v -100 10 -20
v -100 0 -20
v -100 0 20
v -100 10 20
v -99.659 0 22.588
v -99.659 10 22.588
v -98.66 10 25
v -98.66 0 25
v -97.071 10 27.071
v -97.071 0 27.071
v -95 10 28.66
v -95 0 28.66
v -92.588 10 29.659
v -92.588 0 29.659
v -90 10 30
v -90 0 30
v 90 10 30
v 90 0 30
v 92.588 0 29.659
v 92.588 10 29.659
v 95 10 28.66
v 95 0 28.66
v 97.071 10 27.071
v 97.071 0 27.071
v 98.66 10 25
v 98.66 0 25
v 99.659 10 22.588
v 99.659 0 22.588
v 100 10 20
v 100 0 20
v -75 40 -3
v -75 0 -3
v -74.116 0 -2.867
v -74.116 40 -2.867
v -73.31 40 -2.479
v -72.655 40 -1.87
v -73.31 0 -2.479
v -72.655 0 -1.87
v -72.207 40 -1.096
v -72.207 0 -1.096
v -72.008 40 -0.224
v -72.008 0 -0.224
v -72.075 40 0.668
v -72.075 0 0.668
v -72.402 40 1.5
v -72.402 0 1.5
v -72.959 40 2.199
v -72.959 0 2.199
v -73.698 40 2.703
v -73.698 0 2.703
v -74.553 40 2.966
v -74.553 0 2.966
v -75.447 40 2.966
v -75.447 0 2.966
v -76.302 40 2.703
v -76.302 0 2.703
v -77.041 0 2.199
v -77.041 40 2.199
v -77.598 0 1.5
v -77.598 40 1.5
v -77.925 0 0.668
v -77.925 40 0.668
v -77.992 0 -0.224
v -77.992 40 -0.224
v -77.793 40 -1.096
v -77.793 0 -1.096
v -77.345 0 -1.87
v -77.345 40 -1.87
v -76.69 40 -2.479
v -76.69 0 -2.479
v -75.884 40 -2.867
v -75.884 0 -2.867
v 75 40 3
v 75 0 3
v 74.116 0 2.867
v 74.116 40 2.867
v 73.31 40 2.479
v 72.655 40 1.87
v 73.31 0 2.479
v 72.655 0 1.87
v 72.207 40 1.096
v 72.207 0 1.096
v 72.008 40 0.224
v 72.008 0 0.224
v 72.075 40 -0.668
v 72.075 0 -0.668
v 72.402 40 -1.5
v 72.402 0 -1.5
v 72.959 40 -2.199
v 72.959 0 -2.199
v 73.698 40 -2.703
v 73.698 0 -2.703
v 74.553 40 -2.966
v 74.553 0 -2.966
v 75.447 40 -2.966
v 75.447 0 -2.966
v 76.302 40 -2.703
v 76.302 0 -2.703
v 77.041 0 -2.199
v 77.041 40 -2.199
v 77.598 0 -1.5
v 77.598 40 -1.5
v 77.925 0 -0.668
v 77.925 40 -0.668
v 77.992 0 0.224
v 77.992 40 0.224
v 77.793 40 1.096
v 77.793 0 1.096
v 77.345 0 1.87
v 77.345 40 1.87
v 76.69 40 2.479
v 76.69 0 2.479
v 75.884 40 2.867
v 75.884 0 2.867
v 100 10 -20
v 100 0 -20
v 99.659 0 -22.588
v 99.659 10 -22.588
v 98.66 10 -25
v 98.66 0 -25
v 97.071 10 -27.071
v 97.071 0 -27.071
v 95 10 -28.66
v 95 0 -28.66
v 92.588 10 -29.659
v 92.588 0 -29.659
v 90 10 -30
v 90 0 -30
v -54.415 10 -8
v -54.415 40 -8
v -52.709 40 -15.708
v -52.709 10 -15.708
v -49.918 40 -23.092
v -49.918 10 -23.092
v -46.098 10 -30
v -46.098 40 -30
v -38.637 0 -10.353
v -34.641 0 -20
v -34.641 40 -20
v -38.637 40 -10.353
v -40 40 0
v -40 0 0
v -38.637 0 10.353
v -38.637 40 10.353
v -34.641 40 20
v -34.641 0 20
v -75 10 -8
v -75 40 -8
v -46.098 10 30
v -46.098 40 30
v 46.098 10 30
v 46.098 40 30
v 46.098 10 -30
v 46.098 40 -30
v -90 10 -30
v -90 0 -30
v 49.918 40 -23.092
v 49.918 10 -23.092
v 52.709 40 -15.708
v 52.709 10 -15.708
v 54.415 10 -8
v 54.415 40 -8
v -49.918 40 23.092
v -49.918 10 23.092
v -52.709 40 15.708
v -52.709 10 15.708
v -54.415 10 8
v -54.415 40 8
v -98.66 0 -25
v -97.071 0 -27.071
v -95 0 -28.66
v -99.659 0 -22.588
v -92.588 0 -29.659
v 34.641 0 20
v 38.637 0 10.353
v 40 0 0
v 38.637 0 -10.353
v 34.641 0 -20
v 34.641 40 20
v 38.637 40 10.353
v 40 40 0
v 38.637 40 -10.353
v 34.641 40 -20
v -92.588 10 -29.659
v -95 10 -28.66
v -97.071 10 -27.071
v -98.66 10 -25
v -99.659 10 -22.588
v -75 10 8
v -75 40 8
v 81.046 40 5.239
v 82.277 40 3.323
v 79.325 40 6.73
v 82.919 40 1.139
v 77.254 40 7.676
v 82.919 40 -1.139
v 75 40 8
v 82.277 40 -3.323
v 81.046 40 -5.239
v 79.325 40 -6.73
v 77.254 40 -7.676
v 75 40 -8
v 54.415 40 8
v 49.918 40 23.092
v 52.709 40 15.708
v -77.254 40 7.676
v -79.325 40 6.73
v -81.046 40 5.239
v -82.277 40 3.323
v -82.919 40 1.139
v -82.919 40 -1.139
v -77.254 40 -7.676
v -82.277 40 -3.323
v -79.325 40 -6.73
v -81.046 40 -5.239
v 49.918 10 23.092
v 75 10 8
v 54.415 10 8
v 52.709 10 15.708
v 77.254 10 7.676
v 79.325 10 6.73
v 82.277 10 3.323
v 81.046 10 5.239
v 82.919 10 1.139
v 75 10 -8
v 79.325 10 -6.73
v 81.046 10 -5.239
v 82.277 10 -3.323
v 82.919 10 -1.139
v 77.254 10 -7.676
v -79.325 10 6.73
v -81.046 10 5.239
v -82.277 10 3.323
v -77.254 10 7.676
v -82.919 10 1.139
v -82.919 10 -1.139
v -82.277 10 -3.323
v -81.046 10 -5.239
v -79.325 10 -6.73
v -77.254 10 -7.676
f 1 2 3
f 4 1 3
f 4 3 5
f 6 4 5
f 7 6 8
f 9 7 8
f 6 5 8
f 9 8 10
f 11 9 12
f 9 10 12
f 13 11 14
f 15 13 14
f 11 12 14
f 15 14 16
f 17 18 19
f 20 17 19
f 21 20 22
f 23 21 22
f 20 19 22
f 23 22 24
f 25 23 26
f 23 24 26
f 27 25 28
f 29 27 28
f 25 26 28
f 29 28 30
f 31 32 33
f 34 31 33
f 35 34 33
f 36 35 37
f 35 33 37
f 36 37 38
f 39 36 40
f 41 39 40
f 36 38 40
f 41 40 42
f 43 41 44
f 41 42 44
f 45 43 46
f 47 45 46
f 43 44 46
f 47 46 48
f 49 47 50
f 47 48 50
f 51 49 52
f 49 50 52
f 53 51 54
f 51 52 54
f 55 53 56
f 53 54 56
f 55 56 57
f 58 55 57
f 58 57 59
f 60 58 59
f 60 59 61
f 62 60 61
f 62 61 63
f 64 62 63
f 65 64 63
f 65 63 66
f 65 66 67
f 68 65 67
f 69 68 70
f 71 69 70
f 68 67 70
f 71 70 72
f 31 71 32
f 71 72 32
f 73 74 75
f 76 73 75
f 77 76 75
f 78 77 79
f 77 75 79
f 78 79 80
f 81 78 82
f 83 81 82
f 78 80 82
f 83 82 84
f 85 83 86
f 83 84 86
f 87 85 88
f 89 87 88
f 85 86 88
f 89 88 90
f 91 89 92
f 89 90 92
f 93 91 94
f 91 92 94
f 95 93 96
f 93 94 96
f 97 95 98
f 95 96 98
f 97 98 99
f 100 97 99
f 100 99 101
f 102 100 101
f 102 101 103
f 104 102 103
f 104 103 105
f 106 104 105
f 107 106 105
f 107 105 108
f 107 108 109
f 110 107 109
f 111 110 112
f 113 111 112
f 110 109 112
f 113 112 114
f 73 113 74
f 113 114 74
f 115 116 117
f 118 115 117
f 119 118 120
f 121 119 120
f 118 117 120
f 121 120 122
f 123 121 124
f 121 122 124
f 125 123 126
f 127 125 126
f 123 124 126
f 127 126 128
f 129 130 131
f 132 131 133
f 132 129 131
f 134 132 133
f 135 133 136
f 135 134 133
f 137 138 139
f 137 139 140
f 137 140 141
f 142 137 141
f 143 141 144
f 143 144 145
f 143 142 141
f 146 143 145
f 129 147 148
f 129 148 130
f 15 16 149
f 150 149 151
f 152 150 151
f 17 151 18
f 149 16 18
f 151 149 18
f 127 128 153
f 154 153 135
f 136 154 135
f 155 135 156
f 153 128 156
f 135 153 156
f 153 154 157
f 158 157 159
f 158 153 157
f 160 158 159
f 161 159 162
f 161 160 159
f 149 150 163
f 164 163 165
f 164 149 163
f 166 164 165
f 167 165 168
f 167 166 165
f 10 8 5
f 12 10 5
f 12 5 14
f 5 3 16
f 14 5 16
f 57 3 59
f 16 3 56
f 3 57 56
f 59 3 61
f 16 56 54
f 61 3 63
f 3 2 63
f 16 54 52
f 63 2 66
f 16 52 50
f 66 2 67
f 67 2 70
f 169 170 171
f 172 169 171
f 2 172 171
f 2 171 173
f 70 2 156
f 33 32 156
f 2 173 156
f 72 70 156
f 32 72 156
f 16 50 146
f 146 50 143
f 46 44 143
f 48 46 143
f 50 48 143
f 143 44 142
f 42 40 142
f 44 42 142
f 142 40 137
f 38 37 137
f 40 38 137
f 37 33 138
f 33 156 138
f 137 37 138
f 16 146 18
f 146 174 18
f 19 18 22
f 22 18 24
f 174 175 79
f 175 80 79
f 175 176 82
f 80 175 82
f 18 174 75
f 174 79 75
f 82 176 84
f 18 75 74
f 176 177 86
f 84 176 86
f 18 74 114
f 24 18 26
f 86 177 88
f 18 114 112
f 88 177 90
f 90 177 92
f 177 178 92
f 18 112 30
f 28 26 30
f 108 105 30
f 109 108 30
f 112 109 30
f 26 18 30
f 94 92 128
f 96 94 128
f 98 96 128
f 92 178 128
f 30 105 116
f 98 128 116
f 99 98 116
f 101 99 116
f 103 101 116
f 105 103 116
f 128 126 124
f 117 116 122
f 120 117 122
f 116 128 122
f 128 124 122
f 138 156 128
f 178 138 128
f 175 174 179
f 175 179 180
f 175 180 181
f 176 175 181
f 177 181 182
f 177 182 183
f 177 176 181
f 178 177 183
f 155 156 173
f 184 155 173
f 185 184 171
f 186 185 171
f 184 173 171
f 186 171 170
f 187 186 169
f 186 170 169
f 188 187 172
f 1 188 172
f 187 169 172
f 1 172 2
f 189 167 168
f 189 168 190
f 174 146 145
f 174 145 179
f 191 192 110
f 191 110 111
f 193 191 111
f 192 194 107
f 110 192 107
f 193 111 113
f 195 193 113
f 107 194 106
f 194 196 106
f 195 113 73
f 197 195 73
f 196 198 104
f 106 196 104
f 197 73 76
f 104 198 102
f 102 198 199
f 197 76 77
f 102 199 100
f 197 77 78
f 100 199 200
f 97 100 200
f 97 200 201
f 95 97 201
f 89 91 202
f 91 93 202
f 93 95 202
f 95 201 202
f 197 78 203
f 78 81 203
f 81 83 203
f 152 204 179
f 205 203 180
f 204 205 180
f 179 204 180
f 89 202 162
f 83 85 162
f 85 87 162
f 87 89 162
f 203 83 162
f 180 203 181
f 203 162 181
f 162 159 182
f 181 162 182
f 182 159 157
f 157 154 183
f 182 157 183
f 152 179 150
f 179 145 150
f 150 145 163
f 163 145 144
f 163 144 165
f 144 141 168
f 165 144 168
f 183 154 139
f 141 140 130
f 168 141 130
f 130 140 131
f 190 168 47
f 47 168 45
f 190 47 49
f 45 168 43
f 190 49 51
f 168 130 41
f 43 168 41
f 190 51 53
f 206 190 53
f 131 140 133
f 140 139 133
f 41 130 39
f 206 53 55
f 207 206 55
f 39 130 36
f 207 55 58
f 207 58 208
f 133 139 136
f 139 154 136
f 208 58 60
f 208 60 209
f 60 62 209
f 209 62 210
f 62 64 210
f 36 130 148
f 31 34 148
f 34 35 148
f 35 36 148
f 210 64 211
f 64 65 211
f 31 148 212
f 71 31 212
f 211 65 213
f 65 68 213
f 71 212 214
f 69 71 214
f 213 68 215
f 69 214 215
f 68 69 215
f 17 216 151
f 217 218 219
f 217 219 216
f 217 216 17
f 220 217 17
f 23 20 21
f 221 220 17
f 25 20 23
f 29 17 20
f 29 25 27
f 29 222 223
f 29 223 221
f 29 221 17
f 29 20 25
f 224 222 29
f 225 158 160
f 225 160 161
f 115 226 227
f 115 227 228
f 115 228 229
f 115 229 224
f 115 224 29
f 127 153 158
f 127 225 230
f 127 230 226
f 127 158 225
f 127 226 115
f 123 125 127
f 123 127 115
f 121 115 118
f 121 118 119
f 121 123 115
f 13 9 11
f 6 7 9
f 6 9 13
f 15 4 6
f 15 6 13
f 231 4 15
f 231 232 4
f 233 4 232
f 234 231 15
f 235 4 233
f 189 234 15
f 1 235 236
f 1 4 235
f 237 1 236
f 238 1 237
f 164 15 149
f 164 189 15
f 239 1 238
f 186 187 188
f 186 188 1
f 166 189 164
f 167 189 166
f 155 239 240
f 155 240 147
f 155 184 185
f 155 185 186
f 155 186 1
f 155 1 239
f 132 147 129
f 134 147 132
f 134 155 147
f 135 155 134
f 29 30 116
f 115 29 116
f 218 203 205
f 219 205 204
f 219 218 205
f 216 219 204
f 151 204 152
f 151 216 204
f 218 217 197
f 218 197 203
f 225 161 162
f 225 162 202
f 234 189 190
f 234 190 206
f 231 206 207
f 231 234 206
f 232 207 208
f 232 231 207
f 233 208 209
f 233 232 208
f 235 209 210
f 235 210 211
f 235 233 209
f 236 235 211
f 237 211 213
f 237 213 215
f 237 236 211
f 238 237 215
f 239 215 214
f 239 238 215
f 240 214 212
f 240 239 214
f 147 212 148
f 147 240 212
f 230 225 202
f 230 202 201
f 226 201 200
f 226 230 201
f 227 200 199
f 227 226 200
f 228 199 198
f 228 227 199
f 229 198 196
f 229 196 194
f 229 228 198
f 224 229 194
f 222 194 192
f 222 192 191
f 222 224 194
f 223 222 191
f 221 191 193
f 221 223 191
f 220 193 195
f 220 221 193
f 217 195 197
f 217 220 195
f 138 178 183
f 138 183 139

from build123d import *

# Parameters (mm, degrees)
EXTRUDE_2_DEPTH     = 10
EXTRUDE_3_DEPTH     = 30
SKETCH_7_R          = 3
CUT_EXTRUDE_3_DEPTH = 40


with BuildPart() as part:
    # 草图1 → 凸台-拉伸2 (new body)
    with BuildSketch(Plane(origin=(0, 0, 0), x_dir=(1, 0, 0), z_dir=(0, 1, 0))):
        with BuildLine():
            Line((100, -20), (100, 20))
            ThreePointArc((100, 20), (97.071067812, 27.071067812), (90, 30))
            Line((90, 30), (-90, 30))
            ThreePointArc((-90, 30), (-97.071067812, 27.071067812), (-100, 20))
            Line((-100, 20), (-100, -20))
            ThreePointArc((-100, -20), (-97.071067812, -27.071067812), (-90, -30))
            Line((-90, -30), (90, -30))
            ThreePointArc((90, -30), (97.071067812, -27.071067812), (100, -20))
        make_face()
    extrude(amount=EXTRUDE_2_DEPTH)

    # 草图5 → 凸台-拉伸3 (add)
    with BuildSketch(Plane(origin=(0, 10, 0), x_dir=(1, 0, 0), z_dir=(0, 1, 0))):
        with BuildLine():
            Line((-46.097722286, 30), (46.097722286, 30))
            ThreePointArc((46.097722286, 30), (51.446141019, 19.449796252), (54.415071442, 8))
            Line((54.415071442, 8), (75, 8))
            ThreePointArc((75, 8), (83, 0), (75, -8))
            Line((75, -8), (54.415071442, -8))
            ThreePointArc((54.415071442, -8), (51.446141019, -19.449796252), (46.097722286, -30))
            Line((46.097722286, -30), (-46.097722286, -30))
            ThreePointArc((-46.097722286, -30), (-51.446141019, -19.449796252), (-54.415071442, -8))
            Line((-54.415071442, -8), (-75, -8))
            ThreePointArc((-75, -8), (-83, 0), (-75, 8))
            Line((-75, 8), (-54.415071442, 8))
            ThreePointArc((-54.415071442, 8), (-51.446141019, 19.449796252), (-46.097722286, 30))
        make_face()
    extrude(amount=EXTRUDE_3_DEPTH)

    # 草图7 → 切除-拉伸3 (cut)
    with BuildSketch(Plane.XZ):
        with Locations(Location((-75, 0, 0), (0, 0, 270))):
            Circle(SKETCH_7_R)
        with Locations(Location((75, 0, 0), (0, 0, 90))):
            Circle(SKETCH_7_R)
        with BuildLine():
            Line((34.641016151, -20), (-34.641016151, -20))
            ThreePointArc((-34.641016151, -20), (-40, 0), (-34.641016151, 20))
            Line((-34.641016151, 20), (34.641016151, 20))
            ThreePointArc((34.641016151, 20), (40, 0), (34.641016151, -20))
        make_face()
    extrude(amount=-CUT_EXTRUDE_3_DEPTH, mode=Mode.SUBTRACT)


solid = part.part
